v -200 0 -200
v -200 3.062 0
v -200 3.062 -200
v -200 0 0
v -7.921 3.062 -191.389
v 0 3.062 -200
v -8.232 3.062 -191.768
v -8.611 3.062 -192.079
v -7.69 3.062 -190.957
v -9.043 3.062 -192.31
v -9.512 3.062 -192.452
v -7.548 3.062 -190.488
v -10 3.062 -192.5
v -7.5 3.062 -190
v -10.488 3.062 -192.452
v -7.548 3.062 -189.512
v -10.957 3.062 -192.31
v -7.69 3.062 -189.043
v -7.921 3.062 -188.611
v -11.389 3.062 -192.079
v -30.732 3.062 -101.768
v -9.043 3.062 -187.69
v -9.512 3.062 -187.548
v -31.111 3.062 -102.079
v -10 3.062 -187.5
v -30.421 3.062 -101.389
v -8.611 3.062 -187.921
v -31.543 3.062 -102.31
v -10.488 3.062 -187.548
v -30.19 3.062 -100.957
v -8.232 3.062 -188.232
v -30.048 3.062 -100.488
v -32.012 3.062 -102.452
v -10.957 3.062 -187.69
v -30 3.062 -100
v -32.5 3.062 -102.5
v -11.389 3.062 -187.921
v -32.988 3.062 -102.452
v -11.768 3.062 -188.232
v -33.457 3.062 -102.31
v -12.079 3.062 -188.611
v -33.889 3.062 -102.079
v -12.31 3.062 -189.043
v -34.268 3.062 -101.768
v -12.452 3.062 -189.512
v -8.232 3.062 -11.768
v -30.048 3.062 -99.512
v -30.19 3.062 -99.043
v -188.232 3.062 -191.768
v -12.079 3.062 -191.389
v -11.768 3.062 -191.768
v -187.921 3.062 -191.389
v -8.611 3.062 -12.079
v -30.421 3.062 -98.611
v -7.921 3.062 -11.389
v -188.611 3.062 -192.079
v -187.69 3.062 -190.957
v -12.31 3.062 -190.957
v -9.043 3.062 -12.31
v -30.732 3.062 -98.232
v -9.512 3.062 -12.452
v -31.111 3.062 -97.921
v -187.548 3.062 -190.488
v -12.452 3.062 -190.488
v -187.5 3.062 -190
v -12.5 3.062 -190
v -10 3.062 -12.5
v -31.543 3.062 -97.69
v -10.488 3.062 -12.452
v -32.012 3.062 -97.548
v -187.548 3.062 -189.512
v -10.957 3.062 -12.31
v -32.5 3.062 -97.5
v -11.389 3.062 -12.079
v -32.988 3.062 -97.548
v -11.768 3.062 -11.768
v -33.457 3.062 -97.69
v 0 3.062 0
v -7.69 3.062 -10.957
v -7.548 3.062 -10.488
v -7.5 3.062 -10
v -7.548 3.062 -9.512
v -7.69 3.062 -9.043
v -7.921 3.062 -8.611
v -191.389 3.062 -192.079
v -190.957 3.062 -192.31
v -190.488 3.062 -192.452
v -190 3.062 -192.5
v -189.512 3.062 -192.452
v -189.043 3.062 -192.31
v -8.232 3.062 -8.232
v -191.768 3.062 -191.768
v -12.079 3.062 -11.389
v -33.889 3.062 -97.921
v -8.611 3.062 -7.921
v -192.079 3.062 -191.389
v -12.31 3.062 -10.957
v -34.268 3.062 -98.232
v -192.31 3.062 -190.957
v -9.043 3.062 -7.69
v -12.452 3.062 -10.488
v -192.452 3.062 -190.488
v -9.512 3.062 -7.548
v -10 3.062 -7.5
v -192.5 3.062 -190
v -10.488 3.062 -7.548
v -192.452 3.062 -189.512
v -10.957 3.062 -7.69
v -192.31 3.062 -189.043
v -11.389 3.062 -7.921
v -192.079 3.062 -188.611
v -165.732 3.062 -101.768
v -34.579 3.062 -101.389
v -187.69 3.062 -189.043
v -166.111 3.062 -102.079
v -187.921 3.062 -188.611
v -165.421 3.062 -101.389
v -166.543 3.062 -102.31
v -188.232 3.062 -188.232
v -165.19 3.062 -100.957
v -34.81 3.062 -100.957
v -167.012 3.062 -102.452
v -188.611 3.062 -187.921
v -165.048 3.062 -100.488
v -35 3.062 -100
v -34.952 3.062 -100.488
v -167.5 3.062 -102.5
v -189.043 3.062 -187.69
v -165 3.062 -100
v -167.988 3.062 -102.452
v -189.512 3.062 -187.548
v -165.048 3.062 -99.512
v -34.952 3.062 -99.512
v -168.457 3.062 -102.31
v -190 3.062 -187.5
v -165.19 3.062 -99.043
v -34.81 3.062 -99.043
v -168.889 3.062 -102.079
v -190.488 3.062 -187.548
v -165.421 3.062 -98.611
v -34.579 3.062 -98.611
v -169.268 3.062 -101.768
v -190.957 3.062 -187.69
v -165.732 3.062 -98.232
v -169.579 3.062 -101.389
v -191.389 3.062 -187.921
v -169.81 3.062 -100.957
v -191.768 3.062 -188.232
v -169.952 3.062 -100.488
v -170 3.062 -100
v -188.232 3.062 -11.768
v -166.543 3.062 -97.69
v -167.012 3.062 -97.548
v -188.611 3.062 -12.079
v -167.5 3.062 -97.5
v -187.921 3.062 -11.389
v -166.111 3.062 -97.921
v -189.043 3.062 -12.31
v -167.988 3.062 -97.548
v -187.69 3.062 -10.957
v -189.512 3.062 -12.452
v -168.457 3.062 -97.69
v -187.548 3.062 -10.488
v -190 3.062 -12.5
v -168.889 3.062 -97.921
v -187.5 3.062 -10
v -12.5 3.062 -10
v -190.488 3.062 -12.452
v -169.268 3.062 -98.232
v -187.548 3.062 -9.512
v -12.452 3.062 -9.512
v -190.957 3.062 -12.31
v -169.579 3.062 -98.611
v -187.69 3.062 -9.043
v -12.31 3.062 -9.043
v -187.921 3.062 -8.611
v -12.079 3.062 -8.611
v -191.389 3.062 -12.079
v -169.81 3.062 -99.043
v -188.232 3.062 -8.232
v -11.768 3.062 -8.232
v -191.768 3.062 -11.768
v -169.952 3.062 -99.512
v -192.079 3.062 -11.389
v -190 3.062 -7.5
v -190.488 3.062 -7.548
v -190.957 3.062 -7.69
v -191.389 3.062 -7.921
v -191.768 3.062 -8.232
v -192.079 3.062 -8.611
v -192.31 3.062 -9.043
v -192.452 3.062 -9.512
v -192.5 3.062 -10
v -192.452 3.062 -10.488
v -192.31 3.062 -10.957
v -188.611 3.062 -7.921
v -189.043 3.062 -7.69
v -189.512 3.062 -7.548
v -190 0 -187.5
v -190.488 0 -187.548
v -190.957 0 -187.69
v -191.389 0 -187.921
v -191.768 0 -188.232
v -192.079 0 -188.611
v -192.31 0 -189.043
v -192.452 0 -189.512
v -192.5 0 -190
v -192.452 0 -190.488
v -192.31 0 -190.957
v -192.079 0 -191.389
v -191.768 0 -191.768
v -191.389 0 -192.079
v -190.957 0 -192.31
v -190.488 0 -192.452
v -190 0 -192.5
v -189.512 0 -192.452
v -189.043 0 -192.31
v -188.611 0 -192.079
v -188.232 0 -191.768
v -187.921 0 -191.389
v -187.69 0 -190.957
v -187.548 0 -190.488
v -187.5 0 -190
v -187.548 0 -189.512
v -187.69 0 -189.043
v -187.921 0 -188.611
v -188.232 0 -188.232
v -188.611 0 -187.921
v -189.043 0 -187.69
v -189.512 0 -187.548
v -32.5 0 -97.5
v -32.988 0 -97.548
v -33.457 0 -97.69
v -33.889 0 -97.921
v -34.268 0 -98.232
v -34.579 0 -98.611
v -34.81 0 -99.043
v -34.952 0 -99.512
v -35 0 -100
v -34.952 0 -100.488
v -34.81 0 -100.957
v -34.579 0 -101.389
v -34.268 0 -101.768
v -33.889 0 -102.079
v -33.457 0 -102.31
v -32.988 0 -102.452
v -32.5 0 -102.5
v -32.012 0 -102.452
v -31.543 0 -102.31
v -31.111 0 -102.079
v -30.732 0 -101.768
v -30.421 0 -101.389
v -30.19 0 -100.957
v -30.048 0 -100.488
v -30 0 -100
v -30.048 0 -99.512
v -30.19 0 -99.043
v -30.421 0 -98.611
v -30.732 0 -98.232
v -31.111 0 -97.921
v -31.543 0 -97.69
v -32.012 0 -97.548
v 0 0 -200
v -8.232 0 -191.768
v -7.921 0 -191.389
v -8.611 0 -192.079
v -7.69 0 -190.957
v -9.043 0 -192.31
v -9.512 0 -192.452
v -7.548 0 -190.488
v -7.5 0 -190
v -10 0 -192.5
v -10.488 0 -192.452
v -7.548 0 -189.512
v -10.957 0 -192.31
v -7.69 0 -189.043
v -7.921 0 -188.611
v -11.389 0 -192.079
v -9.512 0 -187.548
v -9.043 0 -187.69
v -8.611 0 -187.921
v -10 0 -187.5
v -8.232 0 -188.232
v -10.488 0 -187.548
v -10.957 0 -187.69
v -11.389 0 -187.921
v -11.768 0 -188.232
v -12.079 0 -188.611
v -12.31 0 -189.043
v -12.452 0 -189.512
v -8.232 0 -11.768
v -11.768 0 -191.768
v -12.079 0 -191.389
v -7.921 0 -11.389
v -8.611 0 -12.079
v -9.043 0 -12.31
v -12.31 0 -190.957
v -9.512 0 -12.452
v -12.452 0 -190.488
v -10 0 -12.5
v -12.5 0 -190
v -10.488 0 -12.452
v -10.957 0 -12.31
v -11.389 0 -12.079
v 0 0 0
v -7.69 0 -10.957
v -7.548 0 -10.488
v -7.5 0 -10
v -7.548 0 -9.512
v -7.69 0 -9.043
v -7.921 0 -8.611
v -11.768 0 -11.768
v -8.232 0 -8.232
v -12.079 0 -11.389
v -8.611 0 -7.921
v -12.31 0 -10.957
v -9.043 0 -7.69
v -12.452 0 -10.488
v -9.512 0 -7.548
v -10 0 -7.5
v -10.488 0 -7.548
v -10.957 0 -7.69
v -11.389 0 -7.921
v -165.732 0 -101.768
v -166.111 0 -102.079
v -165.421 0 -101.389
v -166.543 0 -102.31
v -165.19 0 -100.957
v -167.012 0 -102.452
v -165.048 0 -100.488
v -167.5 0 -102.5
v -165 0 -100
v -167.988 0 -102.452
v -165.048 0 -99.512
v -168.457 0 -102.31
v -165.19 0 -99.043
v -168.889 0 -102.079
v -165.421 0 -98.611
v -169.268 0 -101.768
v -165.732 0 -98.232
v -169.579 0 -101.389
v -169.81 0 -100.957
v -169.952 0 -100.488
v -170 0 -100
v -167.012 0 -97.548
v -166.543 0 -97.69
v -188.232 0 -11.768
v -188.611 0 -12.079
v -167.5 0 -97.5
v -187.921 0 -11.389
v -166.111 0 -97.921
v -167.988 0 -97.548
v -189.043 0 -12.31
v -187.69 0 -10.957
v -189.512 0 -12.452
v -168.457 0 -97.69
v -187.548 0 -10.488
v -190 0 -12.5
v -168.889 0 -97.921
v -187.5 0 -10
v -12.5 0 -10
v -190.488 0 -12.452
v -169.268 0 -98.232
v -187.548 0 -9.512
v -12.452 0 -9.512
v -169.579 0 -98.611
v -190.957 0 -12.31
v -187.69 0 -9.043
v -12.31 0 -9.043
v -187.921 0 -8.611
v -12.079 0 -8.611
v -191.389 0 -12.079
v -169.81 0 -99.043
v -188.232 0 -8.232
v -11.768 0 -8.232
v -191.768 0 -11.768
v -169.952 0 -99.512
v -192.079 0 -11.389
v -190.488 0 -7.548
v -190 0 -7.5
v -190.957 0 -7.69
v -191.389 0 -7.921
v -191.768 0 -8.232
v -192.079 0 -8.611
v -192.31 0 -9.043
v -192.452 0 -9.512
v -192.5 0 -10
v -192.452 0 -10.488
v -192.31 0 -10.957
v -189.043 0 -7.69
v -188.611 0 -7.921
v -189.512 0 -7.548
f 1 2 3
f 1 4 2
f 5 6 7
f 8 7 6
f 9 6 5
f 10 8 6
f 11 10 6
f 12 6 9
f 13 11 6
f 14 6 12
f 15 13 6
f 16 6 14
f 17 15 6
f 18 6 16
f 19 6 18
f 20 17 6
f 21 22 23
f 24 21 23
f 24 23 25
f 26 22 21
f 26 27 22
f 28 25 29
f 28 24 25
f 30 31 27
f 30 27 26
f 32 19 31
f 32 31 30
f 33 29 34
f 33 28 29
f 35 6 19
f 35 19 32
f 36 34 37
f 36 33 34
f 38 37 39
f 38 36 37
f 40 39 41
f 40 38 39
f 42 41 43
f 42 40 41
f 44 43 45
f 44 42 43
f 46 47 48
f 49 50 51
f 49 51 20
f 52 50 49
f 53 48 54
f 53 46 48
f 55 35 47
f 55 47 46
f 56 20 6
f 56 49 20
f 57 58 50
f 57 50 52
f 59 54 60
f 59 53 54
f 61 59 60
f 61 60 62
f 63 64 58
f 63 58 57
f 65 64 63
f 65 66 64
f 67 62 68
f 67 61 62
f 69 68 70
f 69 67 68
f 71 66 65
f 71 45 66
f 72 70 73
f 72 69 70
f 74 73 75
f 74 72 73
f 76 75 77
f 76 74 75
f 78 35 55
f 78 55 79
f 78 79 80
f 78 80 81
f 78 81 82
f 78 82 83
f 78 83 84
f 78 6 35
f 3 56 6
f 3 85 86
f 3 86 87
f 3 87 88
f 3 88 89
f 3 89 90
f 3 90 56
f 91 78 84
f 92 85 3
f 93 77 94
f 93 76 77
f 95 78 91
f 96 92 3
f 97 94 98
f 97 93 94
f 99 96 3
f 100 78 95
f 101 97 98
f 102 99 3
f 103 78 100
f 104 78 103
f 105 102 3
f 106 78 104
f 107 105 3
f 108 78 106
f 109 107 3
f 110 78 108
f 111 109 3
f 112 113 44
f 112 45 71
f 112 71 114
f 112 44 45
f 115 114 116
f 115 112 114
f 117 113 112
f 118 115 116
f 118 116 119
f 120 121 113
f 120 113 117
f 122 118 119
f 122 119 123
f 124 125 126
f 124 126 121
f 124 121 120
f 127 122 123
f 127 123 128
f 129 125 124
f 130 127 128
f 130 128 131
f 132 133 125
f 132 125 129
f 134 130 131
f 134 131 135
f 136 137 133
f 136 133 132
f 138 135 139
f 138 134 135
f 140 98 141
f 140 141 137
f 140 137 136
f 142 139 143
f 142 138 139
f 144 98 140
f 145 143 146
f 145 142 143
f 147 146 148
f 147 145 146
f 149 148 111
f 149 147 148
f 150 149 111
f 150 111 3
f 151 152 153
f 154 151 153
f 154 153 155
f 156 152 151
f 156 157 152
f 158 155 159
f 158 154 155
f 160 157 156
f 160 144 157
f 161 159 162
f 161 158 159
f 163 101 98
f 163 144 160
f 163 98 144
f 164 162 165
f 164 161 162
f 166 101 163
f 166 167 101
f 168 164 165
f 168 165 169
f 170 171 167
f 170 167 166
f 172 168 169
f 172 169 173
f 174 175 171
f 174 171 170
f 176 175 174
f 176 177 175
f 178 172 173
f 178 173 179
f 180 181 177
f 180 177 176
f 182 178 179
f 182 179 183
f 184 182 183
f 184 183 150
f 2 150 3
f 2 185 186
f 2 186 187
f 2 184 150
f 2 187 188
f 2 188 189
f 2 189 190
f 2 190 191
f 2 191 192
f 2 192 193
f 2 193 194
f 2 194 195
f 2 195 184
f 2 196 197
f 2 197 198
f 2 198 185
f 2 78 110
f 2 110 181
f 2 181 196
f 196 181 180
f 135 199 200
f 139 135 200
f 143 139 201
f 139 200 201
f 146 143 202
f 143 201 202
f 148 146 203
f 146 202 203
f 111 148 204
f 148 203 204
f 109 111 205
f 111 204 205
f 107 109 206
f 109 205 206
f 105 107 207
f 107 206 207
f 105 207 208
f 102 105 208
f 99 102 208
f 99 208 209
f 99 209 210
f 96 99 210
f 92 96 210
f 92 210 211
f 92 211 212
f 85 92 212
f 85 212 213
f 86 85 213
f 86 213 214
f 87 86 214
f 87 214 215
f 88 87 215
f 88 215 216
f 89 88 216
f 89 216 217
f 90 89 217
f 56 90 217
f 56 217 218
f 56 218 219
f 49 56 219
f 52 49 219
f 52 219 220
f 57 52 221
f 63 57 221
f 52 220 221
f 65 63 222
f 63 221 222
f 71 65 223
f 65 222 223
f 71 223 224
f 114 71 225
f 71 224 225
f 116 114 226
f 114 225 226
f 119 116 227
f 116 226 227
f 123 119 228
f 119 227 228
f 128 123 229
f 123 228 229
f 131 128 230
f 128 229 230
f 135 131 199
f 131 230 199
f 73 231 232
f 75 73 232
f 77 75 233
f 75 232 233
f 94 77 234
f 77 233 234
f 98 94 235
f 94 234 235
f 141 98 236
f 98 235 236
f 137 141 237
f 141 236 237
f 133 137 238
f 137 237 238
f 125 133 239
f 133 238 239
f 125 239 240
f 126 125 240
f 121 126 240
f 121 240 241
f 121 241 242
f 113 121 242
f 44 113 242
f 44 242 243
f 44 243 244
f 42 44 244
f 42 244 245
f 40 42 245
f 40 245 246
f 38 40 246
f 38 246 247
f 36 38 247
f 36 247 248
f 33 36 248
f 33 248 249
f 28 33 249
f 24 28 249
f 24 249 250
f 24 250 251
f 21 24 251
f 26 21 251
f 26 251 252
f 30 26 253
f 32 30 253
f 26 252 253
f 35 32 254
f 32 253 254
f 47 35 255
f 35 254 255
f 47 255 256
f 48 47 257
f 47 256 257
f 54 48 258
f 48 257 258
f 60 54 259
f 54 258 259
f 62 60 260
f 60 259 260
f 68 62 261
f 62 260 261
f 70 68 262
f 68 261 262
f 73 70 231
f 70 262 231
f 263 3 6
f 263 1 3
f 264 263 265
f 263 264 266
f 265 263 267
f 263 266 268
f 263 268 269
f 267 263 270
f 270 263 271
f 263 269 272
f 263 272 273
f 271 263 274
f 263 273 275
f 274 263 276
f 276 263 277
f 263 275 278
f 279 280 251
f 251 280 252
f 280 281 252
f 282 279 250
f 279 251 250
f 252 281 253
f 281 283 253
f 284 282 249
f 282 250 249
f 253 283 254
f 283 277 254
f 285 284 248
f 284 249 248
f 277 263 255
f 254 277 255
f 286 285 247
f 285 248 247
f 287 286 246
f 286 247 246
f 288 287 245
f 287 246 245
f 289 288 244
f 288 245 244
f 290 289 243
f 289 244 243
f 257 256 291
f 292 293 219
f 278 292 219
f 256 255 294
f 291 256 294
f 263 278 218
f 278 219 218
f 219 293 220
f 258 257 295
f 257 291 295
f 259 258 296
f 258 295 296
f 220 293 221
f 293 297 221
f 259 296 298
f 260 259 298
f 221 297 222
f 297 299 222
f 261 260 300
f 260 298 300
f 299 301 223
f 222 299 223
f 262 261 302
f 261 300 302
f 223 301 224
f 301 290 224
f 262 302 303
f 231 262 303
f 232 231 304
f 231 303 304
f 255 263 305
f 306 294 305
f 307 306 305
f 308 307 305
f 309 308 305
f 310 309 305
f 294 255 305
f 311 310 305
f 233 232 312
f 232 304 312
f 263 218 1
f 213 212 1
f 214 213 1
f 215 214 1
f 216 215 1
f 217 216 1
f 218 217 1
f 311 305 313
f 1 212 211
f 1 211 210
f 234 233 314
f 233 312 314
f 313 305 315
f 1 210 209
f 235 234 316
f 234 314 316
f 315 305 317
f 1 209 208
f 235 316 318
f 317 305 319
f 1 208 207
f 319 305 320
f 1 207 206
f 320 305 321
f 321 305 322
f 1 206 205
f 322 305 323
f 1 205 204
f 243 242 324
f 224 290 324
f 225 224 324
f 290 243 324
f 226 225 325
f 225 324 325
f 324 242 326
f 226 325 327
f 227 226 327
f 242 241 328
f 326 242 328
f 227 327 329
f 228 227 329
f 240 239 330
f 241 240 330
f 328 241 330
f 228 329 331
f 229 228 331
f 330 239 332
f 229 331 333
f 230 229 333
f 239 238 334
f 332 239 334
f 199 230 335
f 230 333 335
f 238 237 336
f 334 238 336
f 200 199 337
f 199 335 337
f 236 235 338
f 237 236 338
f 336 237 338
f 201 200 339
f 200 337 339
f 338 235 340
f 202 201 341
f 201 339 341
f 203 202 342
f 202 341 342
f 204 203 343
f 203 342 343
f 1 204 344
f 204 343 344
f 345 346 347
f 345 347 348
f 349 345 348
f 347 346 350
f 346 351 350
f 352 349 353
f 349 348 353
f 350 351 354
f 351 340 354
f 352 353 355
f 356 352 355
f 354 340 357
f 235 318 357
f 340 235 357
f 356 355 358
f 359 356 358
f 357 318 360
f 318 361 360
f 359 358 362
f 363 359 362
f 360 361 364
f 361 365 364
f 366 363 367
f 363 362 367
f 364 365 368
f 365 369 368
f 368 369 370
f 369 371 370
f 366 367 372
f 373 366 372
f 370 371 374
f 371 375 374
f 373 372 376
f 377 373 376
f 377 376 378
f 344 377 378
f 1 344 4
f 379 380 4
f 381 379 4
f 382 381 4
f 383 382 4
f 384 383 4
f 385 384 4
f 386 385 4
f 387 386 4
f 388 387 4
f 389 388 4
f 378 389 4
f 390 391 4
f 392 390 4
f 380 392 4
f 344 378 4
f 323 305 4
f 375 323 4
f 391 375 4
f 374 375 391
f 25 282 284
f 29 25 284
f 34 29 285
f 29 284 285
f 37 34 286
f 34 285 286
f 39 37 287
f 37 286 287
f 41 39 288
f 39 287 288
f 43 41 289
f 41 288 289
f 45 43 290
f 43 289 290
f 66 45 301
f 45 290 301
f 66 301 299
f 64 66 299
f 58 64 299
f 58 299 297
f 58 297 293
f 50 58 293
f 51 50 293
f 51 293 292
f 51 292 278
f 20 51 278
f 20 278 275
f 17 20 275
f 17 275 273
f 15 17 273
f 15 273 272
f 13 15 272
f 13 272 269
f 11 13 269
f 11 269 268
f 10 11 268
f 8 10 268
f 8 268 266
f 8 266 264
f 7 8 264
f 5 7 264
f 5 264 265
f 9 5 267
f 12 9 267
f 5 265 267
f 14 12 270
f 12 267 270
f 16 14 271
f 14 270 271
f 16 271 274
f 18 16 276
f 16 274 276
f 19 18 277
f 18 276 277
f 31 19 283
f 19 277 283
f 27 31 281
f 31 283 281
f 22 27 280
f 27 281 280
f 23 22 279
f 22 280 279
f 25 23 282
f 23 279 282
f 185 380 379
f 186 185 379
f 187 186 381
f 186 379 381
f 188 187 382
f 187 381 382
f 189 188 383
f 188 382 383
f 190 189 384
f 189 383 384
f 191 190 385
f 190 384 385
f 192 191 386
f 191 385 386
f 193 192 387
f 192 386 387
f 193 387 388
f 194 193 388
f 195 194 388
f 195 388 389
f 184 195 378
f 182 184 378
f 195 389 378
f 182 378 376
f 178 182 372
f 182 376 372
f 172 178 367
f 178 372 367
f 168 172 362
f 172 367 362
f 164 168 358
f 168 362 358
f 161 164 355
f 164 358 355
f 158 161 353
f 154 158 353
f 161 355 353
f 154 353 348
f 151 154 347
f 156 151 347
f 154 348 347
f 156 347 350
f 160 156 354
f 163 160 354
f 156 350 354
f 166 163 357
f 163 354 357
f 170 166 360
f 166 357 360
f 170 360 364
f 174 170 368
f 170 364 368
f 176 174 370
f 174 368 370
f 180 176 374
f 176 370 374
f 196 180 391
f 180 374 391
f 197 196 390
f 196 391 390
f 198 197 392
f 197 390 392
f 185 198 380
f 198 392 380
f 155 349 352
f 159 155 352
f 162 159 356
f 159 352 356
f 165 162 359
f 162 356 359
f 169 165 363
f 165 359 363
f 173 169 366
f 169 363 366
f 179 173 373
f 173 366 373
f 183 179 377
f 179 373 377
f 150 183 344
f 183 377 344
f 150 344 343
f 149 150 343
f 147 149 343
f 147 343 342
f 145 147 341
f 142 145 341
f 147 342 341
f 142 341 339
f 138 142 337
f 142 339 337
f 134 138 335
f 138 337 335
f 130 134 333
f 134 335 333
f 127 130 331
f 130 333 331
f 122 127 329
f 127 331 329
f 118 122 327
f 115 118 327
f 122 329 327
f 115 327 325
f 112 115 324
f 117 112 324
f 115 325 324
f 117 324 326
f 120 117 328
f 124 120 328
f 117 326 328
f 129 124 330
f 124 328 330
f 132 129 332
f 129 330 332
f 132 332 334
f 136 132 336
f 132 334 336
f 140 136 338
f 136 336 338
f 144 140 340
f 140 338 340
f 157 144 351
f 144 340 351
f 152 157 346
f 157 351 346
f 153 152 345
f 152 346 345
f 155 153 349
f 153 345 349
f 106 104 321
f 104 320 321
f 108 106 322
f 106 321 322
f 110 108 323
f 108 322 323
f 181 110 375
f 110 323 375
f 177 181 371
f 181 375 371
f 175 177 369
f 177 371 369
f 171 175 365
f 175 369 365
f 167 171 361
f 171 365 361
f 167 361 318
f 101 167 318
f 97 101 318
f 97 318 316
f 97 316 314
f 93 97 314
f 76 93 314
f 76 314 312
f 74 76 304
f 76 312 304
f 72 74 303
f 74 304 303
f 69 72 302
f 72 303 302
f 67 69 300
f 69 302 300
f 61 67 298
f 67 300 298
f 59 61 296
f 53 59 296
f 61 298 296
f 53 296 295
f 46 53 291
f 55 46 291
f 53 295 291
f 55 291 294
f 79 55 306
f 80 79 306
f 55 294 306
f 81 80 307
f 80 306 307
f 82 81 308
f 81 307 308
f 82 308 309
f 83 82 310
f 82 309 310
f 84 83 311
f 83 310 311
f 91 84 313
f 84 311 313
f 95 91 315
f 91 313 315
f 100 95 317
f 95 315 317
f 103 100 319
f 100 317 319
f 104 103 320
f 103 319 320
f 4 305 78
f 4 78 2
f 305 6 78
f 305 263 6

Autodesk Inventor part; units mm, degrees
ref_plane "YZ Plane" through (0, 0, 0) normal (1, 0, 0) x (0, 1, 0)
ref_plane "XZ Plane" through (0, 0, 0) normal (0, 1, 0) x (-1, 0, 0)
ref_plane "XY Plane" through (0, 0, 0) normal (0, 0, 1) x (1, 0, 0)
sketch "Esboço1" plane through (0, 0, 0) normal (0, 1, 0) x (-1, 0, 0)
  line L0 (0, 0) -> (200, 0)
  line L1 (200, 0) -> (200, -200)
  line L2 (200, -200) -> (0, -200)
  line L3 (0, -200) -> (0, 0)
  dimension "d0" = 200
  dimension "d1" = 200
extrude "Extrusão1" add sketch "Esboço1" along normal blind 3.0625
sketch "Esboço2" plane through (0, 3.0625, 0) normal (0, 1, 0) x (1, 0, 0)
  line L0 (0, 0) -> (0, 200) projected
  line L1 (-200, 0) -> (0, 0) projected
  line L2 (-200, 200) -> (-200, 0) projected
  line L3 (0, 200) -> (-200, 200) projected
  point P0 (-10, 10)
  point P1 (-190, 10)
  point P2 (-190, 190)
  point P3 (-10, 190)
  dimension "d4" = 10
  dimension "d5" = 10
  dimension "d6" = 10
  dimension "d7" = 10
  dimension "d8" = 10
  dimension "d9" = 10
  dimension "d10" = 10
  dimension "d11" = 10
  dimension "d34" = 200
  dimension "d35" = 200
hole "Furo1" at (-10, 3.0625, -10) at (-190, 3.0625, -10) at (-190, 3.0625, -190) at (-10, 3.0625, -190) direction (0, -1, 0) diameter 5 end through all
sketch "Esboço3" plane through (0, 3.0625, 0) normal (0, 1, 0) x (1, 0, 0)
  line L0 (-200, 200) -> (-200, 0) projected
  line L1 (-200, 0) -> (0, 0) projected
  line L2 (0, 0) -> (0, 200) projected
  line L3 (0, 200) -> (-200, 200) projected
  point P0 (-32.5, 100)
  point P1 (-167.5, 100)
  dimension "d22" = 135
  dimension "d46" = 200
  dimension "d49" = 100
  dimension "d50" = 0
  dimension "d51" = 32.5
hole "Furo2" at (-32.5, 3.0625, -100) at (-167.5, 3.0625, -100) direction (0, -1, 0) diameter 5 depth 3.0625
equation "\"d5\" = d4"
equation "\"d6\" = d4"
equation "\"d7\" = d5"
equation "\"d8\" = d5"
equation "\"d9\" = d5"
equation "\"d10\" = d9"
equation "\"d11\" = d10"
equation "\"d17\" = Espessura"
equation "\"d49\" = 0.5 * d46"
equation "\"d51\" = -0.5 * d22 + 0.5 * d46"
equation "\"d32\" = Espessura"
equation "\"Raio_vergadura\" = Espessura"
equation "\"Largura_alívio_de_vergadura\" = Espessura"
equation "\"Profundidade_alívio_de_vergadura\" = 0.5 * Espessura"
equation "\"Tamanho_alívio_de_dobra\" = 4 * Espessura"
equation "\"Remanescente_mínimo\" = 2 * Espessura"
equation "\"Raiodetransição\" = Raio_vergadura"
equation "\"Tamanho_de_raio_de_Jacobi\" = Raio_vergadura"
equation "\"TamanhoFolga\" = Espessura"
equation "\"Espessura\" = 0.5"
properties part number "Base de apoio" material "Aço inoxidável"
